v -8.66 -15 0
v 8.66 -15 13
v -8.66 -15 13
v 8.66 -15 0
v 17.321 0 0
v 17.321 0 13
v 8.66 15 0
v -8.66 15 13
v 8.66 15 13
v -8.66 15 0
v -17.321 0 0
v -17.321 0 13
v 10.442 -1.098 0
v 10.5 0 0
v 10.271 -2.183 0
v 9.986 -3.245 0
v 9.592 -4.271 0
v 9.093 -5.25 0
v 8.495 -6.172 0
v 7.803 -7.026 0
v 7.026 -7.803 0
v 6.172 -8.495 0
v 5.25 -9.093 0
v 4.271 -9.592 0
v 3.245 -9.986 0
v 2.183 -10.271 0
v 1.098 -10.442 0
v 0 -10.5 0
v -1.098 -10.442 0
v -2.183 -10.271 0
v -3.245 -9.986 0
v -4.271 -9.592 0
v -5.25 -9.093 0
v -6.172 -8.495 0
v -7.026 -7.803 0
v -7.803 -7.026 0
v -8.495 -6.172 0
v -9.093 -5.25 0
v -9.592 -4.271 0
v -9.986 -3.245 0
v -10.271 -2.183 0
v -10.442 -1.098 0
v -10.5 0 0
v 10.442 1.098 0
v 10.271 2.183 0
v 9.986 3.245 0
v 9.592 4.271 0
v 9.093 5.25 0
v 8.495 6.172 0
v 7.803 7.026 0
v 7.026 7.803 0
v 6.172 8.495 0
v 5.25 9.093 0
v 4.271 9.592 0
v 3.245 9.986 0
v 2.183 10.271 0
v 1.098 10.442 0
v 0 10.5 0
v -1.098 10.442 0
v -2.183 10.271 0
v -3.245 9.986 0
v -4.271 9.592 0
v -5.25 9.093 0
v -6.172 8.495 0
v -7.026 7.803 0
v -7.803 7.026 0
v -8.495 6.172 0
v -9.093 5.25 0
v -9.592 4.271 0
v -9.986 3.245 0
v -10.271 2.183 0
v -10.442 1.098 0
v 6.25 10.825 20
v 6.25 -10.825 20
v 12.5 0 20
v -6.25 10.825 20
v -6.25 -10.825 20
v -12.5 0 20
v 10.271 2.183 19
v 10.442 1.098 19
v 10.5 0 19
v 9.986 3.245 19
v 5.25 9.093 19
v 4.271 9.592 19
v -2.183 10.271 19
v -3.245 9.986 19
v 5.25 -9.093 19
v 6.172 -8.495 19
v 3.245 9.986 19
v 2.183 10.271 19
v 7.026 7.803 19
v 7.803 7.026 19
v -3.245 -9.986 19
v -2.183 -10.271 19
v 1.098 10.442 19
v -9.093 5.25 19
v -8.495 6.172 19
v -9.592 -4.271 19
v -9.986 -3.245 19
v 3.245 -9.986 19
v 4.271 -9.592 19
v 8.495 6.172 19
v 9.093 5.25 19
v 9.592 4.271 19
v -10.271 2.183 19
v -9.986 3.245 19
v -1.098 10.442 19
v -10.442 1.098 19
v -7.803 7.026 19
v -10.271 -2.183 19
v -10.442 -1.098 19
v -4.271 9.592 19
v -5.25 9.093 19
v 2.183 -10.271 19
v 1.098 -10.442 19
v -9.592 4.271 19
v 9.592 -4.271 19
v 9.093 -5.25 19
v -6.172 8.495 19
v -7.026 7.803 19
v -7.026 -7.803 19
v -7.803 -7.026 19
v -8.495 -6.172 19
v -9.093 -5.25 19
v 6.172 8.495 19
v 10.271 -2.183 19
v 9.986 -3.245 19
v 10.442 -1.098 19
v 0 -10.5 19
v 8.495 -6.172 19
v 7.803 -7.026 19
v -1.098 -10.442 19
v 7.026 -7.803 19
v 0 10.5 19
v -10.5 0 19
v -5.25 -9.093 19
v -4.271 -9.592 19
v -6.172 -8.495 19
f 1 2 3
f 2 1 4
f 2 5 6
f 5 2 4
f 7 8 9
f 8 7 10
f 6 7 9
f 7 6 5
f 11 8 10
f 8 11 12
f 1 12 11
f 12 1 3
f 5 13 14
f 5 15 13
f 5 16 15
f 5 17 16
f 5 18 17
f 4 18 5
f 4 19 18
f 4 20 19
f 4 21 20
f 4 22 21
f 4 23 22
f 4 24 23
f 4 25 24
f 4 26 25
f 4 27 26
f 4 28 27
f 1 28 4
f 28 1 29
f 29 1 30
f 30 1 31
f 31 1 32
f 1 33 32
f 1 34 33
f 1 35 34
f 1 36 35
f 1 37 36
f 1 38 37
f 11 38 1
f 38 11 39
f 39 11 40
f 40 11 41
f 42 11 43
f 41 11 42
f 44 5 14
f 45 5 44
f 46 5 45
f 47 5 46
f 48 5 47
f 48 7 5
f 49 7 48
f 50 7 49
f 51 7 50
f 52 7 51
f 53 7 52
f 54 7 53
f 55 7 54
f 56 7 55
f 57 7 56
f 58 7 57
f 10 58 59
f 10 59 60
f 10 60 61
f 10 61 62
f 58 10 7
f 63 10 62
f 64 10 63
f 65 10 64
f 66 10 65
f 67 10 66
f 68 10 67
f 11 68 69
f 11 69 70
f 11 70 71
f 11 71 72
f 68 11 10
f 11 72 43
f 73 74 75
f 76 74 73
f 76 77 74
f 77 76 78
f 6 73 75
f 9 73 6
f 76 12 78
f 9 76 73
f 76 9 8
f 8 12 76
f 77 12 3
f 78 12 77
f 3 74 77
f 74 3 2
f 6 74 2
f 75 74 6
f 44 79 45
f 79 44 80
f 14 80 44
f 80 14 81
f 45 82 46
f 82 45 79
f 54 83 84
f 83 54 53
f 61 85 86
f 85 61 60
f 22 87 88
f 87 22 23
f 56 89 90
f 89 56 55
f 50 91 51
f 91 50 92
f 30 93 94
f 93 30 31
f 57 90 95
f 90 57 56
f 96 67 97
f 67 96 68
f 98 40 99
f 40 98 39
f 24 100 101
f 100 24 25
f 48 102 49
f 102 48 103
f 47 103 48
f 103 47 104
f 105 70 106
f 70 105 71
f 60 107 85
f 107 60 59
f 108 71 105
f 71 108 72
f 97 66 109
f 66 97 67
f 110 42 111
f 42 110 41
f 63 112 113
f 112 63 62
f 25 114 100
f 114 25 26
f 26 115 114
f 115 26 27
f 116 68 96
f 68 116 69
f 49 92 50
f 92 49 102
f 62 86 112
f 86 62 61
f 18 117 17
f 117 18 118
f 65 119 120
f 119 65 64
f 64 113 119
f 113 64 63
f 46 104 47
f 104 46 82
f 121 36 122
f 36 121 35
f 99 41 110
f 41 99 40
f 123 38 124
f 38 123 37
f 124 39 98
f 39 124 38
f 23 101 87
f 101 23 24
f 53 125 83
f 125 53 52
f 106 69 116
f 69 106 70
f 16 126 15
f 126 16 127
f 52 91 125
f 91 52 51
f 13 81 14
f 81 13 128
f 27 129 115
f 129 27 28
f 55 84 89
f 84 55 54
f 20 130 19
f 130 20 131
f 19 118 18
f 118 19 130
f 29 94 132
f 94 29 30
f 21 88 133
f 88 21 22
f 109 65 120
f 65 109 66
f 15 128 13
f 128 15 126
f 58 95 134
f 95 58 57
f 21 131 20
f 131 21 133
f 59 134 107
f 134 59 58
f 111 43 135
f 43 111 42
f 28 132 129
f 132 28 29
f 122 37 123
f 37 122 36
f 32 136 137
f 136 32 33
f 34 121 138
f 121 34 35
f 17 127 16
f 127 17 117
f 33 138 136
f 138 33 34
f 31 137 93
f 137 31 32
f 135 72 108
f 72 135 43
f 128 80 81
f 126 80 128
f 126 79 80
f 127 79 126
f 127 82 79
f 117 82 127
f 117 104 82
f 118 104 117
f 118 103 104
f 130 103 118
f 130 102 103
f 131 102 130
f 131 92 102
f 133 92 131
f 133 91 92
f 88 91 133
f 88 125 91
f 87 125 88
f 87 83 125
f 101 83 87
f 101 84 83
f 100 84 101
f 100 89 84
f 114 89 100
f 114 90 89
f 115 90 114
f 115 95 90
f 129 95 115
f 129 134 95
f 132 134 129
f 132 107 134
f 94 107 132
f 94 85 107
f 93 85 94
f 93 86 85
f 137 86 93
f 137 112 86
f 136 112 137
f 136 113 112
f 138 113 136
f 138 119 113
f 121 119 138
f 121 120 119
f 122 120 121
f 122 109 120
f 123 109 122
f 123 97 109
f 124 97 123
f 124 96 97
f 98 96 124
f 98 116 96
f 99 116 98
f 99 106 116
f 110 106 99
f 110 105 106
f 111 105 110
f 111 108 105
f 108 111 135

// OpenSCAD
// Blind cap nut.
$fn = 60;
eps = 0.02;
thread_d = 21;
flat = 30;
height = 20;
body_h = height*0.65;
difference() {
    union() {
        cylinder(d=flat/cos(30),h=body_h,$fn=6);
        translate([0,0,body_h]) cylinder(d1=flat/cos(30),d2=thread_d+4,h=height-body_h,$fn=6);
    }
    translate([0,0,-eps]) cylinder(d=thread_d,h=height-1+eps);
}
